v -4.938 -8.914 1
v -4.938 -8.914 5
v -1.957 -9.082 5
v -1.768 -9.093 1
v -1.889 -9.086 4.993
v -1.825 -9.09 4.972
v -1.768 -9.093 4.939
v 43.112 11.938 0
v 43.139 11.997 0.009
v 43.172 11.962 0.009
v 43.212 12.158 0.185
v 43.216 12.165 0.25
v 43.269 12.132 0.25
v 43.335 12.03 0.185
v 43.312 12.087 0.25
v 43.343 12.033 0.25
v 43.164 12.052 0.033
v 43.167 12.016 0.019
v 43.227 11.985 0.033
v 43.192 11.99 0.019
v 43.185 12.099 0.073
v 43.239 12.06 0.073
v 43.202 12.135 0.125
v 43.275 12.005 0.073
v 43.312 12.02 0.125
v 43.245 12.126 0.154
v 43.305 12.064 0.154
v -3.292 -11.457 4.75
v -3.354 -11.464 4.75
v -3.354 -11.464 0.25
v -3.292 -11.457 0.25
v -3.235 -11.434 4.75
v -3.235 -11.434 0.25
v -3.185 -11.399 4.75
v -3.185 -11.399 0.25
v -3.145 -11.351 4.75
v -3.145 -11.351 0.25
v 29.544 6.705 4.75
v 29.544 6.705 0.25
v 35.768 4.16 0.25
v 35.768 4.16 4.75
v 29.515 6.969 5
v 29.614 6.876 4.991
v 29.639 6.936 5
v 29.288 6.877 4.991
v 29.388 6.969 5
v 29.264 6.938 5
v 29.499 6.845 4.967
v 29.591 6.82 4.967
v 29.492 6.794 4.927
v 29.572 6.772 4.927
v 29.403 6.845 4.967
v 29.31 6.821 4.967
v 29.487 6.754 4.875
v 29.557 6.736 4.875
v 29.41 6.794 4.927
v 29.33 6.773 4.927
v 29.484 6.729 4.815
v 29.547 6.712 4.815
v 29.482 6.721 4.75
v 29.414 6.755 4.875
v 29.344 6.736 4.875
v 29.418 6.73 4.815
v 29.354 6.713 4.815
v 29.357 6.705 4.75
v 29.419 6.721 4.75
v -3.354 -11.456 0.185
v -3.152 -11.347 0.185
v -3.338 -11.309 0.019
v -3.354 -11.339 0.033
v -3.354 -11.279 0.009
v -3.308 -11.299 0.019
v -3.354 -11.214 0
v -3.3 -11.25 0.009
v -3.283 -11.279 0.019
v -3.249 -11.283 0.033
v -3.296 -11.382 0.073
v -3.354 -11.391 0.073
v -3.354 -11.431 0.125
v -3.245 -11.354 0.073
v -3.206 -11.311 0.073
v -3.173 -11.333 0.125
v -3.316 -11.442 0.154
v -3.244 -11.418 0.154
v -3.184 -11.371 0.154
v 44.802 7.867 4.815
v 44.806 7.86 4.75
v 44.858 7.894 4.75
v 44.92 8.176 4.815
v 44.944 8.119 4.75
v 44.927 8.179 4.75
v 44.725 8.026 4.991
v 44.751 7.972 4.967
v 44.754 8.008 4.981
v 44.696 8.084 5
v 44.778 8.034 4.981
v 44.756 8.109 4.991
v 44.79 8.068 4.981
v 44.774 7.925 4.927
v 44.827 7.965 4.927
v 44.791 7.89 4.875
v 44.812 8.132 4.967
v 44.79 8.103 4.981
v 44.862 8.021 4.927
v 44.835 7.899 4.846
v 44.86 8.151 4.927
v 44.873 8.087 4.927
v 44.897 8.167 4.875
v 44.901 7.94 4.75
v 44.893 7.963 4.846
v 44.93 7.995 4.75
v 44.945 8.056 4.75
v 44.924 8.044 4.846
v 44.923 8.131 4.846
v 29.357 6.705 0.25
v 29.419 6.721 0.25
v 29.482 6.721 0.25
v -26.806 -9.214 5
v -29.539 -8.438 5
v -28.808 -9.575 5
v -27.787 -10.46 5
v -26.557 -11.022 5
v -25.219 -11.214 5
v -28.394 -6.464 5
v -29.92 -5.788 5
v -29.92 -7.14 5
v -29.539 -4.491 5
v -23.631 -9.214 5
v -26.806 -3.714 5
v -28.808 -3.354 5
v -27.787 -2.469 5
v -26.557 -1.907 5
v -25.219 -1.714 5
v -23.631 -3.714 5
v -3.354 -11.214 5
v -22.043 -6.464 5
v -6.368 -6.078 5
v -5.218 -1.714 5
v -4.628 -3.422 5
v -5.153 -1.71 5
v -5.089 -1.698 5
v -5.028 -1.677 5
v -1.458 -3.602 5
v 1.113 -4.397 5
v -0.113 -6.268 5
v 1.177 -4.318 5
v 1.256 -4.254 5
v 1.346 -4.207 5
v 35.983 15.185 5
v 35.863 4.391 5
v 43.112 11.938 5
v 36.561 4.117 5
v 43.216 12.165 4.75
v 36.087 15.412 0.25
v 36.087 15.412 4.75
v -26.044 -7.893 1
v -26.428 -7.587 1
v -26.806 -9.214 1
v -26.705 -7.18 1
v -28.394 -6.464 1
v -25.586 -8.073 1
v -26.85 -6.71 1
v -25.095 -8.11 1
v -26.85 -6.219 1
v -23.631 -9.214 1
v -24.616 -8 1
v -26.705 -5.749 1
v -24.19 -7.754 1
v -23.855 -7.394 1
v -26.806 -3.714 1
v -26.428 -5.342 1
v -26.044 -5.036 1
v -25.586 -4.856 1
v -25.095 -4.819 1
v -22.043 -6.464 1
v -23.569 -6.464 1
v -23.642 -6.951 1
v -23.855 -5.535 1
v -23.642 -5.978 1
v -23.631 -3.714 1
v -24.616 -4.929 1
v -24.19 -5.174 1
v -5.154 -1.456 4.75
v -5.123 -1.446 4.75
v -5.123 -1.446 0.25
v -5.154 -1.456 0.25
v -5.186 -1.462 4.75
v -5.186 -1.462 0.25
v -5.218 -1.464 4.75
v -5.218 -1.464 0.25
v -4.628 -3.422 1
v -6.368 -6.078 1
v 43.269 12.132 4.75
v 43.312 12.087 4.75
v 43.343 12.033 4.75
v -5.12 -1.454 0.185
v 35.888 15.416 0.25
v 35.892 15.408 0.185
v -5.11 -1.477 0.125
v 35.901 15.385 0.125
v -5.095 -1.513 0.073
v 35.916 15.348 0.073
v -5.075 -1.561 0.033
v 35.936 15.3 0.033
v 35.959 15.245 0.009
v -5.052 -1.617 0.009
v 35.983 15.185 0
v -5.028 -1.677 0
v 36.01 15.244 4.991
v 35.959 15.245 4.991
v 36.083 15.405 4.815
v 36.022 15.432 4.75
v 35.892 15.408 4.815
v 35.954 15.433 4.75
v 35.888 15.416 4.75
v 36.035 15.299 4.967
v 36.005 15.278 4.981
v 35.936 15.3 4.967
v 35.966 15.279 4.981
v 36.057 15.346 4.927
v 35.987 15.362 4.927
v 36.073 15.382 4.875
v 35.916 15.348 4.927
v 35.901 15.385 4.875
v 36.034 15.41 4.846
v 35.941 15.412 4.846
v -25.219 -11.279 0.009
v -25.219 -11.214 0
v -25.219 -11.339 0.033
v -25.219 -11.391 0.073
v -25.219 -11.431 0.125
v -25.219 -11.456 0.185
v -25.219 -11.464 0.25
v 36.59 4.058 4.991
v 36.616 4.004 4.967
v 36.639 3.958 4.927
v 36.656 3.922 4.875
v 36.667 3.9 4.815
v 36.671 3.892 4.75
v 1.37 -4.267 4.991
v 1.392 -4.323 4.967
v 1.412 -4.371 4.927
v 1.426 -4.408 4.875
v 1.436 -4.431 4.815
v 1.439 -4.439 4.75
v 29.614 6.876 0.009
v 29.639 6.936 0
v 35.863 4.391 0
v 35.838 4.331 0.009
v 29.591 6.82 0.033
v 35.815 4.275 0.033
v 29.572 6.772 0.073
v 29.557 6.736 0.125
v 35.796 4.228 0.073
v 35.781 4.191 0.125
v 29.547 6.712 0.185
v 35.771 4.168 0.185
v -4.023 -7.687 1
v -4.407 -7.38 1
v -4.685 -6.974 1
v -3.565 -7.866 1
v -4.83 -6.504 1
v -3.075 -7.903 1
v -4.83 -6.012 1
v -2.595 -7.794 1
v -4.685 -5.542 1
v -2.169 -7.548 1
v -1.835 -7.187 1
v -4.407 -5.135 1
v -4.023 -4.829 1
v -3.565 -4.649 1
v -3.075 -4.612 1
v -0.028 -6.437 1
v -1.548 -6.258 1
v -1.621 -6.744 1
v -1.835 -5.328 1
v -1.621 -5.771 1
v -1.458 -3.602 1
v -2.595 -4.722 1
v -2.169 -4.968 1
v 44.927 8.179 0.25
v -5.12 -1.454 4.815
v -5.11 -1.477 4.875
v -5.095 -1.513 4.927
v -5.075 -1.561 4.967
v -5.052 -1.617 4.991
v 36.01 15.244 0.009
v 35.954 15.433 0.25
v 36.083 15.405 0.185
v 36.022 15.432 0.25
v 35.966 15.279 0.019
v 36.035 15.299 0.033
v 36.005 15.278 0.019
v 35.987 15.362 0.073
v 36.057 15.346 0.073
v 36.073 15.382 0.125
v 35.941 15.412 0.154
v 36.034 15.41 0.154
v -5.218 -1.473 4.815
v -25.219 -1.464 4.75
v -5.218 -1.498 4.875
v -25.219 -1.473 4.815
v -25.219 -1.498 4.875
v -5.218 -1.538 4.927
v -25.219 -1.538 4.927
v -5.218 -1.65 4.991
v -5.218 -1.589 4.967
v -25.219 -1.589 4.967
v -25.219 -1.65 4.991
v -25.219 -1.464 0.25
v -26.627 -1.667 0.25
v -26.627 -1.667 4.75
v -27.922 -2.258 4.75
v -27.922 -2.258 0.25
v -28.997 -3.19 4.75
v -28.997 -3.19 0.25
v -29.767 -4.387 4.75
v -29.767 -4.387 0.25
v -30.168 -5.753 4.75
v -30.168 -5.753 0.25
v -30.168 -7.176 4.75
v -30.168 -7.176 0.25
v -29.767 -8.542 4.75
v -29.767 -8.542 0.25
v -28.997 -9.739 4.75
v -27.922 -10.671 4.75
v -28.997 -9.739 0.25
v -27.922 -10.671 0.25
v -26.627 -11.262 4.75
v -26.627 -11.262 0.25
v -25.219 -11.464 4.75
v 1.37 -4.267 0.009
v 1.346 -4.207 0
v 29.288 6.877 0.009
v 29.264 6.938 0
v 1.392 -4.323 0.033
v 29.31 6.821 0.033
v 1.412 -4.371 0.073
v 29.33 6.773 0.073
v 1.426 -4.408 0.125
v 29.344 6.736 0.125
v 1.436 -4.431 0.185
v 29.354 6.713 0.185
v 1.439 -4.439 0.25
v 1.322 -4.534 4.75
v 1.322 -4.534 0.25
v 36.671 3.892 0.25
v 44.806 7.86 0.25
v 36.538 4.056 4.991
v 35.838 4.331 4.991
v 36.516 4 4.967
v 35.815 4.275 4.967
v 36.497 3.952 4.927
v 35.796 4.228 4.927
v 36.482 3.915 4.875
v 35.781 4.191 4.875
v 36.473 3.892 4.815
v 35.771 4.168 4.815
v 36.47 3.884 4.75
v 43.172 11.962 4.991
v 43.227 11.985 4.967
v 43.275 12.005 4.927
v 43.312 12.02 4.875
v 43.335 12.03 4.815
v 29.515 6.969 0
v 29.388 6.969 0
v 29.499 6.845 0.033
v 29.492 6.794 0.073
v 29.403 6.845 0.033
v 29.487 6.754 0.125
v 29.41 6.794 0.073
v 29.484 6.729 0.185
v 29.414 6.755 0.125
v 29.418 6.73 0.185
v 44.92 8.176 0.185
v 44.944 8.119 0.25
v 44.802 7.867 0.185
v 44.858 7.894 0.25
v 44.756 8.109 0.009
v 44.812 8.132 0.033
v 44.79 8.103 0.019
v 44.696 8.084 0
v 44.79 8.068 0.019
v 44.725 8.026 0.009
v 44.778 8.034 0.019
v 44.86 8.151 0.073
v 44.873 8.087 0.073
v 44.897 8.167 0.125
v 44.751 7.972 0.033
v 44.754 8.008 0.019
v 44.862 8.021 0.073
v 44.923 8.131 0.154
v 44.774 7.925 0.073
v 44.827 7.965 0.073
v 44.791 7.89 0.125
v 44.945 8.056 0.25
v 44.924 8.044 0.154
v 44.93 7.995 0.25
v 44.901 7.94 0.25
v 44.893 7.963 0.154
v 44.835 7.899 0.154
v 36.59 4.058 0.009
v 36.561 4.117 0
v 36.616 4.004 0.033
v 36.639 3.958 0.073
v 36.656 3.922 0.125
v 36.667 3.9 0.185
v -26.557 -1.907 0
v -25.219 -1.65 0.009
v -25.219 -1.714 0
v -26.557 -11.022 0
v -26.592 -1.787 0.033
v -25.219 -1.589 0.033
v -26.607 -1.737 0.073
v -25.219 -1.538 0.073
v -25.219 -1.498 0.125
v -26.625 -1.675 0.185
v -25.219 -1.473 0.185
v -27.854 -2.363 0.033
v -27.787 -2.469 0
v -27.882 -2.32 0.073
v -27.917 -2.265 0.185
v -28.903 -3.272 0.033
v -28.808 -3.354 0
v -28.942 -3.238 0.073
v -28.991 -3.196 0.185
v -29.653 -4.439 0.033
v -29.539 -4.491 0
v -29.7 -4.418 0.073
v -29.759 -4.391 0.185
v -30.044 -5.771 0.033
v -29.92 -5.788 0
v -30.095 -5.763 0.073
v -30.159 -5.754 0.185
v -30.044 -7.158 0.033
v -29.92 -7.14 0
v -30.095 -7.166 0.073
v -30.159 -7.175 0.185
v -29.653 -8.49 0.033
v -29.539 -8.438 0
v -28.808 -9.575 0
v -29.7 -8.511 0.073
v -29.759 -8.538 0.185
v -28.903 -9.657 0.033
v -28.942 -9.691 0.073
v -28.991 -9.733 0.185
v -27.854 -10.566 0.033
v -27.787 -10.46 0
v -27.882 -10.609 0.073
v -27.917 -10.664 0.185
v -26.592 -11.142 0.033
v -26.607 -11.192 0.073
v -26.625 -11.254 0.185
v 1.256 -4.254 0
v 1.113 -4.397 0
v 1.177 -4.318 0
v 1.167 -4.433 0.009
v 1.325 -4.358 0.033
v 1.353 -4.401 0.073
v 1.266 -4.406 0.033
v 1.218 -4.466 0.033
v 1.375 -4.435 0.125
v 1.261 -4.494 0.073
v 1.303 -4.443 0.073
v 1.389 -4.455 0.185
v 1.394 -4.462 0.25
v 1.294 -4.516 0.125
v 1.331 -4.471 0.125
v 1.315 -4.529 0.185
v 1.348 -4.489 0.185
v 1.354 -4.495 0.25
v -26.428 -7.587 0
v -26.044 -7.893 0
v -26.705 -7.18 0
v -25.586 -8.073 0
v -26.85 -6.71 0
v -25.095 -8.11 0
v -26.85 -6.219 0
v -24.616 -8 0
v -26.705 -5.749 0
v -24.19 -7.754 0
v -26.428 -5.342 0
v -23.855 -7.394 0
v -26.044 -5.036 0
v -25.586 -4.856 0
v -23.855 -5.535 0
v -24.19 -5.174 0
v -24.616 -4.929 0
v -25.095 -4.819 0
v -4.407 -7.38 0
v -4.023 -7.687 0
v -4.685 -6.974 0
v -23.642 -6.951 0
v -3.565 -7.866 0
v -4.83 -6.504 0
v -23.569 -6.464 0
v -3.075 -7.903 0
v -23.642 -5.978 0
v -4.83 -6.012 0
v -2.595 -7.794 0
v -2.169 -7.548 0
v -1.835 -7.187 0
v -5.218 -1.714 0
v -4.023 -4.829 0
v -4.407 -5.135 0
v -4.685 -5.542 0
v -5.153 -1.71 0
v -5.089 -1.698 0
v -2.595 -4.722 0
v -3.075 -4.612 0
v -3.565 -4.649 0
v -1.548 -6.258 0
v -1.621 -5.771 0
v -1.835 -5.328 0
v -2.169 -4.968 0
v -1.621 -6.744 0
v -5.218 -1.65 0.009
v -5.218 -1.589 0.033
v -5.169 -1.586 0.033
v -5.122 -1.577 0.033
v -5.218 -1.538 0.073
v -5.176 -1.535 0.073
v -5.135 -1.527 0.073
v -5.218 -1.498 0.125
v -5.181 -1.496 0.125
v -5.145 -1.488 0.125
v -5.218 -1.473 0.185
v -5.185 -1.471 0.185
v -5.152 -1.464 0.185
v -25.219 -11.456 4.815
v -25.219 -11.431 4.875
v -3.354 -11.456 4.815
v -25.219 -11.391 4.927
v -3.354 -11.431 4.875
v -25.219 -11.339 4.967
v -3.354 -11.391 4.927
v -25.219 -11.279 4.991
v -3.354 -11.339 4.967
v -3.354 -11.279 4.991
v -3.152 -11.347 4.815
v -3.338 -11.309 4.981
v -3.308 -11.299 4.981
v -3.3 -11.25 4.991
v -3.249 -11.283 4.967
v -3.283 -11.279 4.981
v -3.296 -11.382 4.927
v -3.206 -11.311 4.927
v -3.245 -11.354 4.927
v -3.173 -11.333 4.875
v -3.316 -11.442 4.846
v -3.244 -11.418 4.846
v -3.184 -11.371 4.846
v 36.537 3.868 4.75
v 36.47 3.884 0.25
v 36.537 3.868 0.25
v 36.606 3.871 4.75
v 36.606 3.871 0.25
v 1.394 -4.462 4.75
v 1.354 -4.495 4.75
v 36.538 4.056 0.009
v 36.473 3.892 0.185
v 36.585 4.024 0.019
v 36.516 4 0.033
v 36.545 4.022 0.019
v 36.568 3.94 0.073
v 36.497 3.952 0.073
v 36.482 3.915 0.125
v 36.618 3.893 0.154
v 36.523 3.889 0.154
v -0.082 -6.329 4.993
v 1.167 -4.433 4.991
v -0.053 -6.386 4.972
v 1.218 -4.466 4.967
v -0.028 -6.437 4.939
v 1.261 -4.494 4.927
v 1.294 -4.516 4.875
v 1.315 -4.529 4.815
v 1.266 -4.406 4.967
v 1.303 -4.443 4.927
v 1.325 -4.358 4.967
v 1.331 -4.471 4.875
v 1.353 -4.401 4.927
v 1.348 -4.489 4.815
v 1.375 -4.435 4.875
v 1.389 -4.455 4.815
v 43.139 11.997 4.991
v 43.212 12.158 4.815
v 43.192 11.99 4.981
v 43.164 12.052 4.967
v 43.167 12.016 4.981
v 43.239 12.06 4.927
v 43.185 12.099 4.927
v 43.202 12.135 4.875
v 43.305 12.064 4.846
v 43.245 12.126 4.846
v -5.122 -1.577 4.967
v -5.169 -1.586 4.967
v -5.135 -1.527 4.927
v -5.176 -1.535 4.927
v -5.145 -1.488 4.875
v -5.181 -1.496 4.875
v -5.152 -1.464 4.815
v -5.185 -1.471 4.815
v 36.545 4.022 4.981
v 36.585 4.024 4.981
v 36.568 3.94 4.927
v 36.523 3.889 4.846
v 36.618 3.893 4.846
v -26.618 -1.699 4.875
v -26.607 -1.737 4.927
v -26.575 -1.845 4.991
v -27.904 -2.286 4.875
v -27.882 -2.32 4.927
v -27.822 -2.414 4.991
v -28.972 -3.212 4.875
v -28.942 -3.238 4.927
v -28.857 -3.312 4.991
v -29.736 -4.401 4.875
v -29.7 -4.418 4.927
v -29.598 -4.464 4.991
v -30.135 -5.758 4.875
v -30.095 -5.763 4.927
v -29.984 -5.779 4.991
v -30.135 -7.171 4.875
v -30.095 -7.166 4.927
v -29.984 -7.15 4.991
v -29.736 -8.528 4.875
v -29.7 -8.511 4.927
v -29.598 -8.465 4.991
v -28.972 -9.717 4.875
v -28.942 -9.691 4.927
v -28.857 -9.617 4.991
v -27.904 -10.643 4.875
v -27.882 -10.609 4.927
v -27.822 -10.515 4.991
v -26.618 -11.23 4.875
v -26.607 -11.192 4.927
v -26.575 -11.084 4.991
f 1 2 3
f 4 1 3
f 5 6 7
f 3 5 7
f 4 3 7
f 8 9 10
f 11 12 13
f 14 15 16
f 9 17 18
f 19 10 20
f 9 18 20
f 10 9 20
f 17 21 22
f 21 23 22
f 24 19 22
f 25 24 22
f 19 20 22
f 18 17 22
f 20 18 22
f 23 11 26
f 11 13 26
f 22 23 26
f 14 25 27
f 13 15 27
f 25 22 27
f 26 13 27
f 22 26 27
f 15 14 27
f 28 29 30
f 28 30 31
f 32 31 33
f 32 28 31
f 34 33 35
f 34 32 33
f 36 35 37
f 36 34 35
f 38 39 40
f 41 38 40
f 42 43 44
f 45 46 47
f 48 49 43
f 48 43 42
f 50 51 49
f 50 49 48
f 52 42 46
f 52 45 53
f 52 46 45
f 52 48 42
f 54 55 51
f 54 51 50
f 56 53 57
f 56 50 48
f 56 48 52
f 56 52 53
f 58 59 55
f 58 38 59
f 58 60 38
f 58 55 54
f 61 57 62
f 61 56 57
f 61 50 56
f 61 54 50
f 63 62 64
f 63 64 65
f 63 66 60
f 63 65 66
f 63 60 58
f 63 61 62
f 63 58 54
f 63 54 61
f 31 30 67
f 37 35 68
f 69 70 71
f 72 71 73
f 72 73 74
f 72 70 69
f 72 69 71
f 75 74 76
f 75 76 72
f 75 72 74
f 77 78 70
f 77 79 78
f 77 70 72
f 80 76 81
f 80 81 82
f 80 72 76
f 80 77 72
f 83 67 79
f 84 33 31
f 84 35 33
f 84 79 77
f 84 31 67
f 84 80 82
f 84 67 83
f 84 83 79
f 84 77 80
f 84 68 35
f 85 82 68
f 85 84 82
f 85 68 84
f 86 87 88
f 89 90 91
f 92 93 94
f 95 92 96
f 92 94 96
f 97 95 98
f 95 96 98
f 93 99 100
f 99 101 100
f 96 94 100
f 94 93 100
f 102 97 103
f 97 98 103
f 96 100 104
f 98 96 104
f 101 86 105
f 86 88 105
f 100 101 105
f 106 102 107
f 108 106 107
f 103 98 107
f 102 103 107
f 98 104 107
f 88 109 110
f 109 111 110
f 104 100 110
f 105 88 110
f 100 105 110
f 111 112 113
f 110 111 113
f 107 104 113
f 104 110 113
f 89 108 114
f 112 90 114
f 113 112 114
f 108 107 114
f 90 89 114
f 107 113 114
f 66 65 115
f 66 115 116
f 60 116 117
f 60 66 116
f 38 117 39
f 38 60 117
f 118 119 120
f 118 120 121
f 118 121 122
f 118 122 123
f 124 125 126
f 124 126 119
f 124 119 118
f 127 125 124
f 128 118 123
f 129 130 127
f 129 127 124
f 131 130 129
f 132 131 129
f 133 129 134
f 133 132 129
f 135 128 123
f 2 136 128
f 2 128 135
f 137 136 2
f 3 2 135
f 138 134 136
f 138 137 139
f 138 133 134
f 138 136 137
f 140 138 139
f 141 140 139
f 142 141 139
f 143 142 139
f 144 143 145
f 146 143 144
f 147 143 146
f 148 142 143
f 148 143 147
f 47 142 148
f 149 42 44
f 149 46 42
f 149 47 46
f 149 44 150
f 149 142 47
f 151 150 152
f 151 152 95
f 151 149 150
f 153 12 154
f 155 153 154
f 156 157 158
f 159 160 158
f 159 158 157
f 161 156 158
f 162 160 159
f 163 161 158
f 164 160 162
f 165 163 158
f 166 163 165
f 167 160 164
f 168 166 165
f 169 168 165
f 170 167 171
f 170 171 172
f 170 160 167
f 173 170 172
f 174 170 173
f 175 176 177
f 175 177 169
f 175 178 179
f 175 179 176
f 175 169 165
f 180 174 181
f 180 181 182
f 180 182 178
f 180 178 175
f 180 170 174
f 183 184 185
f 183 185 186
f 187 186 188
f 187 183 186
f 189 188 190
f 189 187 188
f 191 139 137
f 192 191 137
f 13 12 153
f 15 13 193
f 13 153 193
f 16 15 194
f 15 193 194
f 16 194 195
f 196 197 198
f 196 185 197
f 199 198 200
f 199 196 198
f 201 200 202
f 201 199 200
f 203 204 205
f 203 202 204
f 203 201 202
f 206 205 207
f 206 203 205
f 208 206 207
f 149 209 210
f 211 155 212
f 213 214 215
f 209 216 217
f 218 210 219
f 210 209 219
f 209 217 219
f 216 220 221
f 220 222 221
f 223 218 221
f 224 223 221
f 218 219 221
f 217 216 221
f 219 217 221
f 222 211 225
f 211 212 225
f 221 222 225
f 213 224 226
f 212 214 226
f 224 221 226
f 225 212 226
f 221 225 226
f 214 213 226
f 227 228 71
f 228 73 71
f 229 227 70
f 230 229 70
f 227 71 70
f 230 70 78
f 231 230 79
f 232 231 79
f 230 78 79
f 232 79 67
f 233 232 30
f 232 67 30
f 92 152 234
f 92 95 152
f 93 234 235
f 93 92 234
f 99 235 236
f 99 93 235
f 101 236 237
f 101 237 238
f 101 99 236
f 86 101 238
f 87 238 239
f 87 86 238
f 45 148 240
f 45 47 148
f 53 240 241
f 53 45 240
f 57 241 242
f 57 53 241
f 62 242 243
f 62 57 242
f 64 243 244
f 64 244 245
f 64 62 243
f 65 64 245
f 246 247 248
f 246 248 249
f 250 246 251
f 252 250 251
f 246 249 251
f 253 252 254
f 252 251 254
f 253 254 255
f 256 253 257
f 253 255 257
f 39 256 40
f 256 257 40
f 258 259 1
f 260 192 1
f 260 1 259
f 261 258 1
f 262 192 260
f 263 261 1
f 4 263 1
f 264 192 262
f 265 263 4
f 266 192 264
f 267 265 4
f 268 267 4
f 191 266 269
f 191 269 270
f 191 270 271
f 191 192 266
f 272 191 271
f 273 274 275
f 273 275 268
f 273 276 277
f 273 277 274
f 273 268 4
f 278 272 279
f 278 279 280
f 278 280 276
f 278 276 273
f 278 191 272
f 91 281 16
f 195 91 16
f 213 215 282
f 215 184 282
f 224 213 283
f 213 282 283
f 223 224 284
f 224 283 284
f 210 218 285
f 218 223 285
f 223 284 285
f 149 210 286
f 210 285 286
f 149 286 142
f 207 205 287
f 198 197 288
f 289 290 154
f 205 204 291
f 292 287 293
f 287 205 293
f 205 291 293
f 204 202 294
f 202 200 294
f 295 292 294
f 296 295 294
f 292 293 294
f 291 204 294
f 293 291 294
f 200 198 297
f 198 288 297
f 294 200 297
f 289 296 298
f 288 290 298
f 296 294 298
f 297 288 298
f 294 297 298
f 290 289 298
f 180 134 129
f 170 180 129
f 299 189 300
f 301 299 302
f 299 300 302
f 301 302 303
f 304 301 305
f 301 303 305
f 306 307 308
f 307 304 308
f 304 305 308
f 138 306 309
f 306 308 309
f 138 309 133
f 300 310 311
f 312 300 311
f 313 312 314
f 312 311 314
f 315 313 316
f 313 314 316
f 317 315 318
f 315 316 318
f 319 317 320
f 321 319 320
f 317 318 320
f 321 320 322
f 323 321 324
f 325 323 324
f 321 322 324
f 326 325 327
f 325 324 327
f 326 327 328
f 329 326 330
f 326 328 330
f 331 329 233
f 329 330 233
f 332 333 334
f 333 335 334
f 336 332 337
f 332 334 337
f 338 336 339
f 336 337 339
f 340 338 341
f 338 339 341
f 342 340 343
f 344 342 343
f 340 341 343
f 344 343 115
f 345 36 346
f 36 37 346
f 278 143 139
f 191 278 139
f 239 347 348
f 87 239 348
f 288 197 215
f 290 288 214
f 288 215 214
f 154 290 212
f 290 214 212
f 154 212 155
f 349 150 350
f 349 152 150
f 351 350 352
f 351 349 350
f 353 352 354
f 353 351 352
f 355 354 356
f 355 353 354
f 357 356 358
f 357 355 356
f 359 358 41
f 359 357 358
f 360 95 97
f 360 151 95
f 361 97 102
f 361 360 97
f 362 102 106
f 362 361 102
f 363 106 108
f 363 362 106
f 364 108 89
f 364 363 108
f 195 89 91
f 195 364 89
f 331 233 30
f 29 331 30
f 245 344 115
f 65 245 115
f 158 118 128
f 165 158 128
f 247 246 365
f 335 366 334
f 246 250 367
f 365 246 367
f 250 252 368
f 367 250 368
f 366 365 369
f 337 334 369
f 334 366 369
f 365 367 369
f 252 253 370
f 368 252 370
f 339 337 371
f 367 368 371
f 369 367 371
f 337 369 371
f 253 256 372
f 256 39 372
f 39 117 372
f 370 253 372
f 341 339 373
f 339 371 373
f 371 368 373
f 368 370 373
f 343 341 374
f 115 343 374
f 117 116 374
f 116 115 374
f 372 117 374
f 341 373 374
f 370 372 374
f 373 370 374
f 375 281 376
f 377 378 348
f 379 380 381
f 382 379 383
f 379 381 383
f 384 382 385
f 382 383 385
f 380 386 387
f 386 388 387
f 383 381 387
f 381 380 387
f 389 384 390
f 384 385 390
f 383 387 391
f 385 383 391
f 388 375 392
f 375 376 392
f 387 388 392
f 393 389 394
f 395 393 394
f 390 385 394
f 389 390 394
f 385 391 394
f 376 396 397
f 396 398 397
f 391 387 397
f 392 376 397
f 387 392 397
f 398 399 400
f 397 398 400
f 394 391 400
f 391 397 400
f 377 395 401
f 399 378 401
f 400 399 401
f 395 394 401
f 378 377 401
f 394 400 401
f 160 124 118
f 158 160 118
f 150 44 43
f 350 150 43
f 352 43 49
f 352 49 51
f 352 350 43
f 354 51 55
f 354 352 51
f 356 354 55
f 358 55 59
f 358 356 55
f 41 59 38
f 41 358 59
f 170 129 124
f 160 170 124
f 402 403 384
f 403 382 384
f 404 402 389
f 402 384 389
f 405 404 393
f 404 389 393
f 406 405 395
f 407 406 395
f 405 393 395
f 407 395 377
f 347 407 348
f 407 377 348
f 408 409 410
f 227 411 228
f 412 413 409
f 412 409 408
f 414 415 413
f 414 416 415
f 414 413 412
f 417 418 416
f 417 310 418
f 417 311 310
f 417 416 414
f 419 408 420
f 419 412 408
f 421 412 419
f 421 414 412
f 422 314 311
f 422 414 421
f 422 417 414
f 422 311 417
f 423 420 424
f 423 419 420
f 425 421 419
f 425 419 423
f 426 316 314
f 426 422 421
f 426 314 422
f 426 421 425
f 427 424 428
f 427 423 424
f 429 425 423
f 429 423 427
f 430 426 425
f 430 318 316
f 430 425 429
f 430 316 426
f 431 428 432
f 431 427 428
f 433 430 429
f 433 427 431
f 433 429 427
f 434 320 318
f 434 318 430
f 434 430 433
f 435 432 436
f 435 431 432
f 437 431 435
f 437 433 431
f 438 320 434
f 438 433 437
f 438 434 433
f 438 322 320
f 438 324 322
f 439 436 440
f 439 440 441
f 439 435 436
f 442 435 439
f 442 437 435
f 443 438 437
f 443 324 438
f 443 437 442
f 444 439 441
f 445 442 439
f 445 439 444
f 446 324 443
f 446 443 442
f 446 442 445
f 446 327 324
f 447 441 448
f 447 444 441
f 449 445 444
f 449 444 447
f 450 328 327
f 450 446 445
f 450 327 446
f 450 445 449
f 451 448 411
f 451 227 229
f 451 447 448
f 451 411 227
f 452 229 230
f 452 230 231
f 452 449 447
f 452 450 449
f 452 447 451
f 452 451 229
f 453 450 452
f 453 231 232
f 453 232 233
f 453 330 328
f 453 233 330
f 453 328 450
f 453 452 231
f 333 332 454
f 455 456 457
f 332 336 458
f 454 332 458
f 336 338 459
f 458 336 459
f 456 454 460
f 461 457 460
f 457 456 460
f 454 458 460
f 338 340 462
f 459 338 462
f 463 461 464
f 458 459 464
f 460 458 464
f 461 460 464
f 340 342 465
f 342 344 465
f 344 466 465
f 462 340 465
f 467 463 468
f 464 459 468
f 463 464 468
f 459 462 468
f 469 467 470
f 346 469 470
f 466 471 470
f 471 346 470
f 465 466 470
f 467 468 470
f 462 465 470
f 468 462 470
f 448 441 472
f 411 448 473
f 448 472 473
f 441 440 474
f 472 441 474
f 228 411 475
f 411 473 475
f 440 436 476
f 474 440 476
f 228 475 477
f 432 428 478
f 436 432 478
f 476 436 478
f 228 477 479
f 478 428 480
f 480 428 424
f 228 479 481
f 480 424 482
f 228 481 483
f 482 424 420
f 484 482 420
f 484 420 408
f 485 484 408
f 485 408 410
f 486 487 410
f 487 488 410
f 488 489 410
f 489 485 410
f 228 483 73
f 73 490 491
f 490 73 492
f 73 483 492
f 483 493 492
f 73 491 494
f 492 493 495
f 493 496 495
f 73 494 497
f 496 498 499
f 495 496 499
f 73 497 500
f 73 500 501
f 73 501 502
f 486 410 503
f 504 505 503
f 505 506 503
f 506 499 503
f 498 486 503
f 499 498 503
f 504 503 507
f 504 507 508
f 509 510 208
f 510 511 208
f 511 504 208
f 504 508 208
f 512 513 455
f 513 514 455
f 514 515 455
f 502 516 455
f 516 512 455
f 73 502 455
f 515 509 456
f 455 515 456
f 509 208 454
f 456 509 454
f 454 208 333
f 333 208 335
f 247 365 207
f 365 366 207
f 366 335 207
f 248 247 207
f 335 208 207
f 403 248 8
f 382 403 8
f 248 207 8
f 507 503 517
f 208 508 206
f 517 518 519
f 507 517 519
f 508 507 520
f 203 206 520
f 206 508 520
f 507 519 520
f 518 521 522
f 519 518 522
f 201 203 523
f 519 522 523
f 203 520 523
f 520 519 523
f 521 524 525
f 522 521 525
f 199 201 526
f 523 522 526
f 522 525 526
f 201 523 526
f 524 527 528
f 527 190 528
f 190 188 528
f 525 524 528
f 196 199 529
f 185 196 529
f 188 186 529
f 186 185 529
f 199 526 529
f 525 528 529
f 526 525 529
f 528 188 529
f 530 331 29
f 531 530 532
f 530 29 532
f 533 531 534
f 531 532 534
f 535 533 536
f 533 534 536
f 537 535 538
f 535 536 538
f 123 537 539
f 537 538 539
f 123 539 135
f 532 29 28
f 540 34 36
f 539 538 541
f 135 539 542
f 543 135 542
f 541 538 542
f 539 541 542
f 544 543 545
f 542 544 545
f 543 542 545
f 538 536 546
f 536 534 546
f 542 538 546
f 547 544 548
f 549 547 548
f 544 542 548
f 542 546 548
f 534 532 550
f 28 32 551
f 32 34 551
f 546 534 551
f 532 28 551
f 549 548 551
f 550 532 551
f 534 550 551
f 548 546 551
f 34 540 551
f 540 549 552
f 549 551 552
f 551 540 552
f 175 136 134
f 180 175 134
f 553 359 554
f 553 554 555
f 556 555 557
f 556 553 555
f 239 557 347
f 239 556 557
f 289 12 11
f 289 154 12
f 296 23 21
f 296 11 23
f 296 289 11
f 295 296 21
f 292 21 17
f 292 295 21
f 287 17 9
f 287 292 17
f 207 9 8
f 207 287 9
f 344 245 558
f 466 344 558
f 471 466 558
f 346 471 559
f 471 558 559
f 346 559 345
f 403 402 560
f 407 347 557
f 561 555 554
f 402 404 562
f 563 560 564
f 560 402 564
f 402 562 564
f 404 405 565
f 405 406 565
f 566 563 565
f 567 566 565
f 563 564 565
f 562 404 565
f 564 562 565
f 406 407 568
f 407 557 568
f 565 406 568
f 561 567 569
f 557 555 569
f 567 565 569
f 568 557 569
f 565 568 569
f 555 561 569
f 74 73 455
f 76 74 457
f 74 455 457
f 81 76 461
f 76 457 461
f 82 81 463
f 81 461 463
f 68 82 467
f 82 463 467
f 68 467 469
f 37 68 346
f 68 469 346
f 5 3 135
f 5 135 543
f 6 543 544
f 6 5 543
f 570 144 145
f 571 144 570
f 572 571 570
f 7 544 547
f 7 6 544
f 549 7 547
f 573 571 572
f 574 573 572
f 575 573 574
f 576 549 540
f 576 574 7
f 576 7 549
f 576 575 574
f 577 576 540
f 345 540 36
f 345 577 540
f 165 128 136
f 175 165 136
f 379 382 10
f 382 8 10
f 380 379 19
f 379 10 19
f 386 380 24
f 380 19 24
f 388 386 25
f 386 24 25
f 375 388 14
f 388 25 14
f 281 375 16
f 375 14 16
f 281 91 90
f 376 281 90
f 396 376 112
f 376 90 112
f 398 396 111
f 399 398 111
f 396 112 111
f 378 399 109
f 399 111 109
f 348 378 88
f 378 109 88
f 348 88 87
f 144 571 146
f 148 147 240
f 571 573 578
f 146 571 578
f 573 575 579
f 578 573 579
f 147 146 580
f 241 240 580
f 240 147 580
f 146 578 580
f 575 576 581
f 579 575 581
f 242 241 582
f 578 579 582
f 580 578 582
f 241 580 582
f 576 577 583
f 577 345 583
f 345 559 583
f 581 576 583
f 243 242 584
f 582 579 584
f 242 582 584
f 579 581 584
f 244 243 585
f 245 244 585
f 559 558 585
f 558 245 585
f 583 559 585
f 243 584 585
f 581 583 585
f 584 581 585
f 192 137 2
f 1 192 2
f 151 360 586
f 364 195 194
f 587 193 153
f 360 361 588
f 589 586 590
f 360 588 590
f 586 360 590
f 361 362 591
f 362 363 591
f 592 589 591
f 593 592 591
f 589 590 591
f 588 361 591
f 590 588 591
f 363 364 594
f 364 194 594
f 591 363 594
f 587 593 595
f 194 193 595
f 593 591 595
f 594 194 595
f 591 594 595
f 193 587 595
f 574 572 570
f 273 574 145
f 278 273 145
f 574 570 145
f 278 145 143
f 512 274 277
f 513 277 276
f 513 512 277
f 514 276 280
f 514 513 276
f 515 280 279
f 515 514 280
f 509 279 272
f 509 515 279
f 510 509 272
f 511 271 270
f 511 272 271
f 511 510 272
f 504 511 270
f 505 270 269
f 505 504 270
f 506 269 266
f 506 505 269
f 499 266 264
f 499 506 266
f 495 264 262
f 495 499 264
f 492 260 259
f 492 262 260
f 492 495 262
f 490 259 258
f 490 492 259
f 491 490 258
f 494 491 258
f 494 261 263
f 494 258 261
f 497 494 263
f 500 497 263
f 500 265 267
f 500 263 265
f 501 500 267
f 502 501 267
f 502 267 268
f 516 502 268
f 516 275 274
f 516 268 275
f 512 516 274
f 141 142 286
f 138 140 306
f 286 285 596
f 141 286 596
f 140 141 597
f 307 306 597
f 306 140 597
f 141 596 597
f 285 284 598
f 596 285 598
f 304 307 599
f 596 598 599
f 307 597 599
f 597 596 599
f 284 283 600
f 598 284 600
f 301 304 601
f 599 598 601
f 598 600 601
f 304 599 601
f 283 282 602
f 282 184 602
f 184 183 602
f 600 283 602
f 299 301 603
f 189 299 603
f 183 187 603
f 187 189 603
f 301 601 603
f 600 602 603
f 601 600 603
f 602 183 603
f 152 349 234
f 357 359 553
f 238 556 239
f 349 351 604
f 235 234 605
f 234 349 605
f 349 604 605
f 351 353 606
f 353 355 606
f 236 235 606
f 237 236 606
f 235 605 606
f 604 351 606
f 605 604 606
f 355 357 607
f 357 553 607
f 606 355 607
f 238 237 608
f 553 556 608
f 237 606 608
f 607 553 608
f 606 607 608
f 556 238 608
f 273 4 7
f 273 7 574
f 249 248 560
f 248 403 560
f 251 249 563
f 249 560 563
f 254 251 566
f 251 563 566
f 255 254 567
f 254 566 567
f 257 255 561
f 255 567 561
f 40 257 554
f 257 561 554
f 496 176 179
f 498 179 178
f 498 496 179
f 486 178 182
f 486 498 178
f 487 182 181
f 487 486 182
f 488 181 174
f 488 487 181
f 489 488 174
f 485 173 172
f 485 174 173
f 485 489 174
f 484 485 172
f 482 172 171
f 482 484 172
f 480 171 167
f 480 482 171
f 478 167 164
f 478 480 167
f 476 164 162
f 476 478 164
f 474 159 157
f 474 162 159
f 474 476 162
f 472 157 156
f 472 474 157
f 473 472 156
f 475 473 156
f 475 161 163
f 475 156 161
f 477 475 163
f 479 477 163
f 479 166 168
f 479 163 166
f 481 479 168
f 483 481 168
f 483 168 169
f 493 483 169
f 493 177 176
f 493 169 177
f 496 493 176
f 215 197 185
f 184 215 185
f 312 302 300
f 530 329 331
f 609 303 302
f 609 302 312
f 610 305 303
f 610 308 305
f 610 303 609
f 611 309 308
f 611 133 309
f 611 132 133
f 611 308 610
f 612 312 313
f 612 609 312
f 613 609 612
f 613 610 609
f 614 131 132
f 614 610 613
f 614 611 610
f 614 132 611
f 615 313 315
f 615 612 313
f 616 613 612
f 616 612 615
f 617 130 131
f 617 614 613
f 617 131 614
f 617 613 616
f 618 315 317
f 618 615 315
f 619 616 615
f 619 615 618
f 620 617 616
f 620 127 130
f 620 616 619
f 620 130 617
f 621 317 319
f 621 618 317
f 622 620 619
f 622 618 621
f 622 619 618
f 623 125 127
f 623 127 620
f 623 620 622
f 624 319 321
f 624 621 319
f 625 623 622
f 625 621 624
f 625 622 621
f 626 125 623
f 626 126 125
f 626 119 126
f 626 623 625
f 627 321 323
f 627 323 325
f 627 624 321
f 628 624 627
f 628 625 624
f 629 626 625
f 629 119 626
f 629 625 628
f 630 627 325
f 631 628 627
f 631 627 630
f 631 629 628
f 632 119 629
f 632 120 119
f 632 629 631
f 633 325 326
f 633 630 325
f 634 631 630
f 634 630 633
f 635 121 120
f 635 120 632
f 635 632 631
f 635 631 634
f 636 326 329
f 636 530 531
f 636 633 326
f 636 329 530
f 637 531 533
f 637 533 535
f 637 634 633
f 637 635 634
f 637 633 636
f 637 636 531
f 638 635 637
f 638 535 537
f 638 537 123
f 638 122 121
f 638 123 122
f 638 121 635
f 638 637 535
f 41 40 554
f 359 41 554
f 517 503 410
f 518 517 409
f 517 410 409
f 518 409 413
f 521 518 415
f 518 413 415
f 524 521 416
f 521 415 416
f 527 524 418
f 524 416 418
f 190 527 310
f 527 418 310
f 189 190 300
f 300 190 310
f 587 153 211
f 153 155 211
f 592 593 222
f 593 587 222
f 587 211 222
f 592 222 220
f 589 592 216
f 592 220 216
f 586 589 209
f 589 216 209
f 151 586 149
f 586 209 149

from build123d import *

# Parameters (mm, degrees)
SKETCH1_R           = 1.65
BOSS_EXTRUDE1_DEPTH = 5
FILLET2_R           = 0.25
CUT_EXTRUDE1_DEPTH  = 4


with BuildPart() as part:
    # Sketch1 → Boss-Extrude1 (new body)
    # profile 1 of 2: a face of its own
    with BuildSketch(Plane.XY):
        with BuildLine():
            Line((-5.168635154, -1.464478016), (-25.218635154, -1.464478016))
            ThreePointArc((-25.218635154, -1.464478016), (-30.218635154, -6.464478016), (-25.218635154, -11.464478016))
            Line((-25.218635154, -11.464478016), (-3.218635154, -11.464478016))
            Line((-3.218635154, -11.464478016), (1.36555506, -4.468181425))
            ThreePointArc((1.36555506, -4.468181425), (-0.47833252, -2.282284635), (-3.218635154, -1.464478016))
            Line((-3.218635154, -1.464478016), (-5.168635154, -1.464478016))
        make_face()
        with Locations((-25.218635154, -6.464478016)):
            Circle(SKETCH1_R, mode=Mode.SUBTRACT)
        with Locations((-3.197929879, -6.257635448)):
            Circle(SKETCH1_R, mode=Mode.SUBTRACT)
    # profile 2 of 2: a face of its own
    with BuildSketch(Plane.XY):
        with BuildLine():
            Line((35.988446, 15.45724385), (-5.168635154, -1.464478016))
            Line((-5.168635154, -1.464478016), (-3.218635154, -1.464478016))
            ThreePointArc((-3.218635154, -1.464478016), (-0.47833252, -2.282284635), (1.36555506, -4.468181425))
            Line((1.36555506, -4.468181425), (29.450627286, 6.742809526))
            Line((29.450627286, 6.742809526), (35.767904523, 4.15974363))
            Line((35.767904523, 4.15974363), (36.572261964, 3.843716482))
            Line((36.572261964, 3.843716482), (45.016686804, 7.962377757))
            Line((45.016686804, 7.962377757), (43.305501447, 12.124329784))
            Line((43.305501447, 12.124329784), (35.988446, 15.45724385))
        make_face()
    extrude(amount=BOSS_EXTRUDE1_DEPTH)

    # Fillet2
    fillet2_edges = [part.edges().sort_by_distance(p)[0] for p in [
        (-14.218635154, -11.464478016, 0),
        (-30.218635154, -6.464478016, 0),
        (-15.193635154, -1.464478016, 0),
        (15.409905423, 6.996382917, 0),
        (-0.926540047, -7.966329721, 5),
        (39.646973723, 13.790786817, 0),
        (44.161094126, 10.04335377, 0),
        (40.794474384, 5.90304712, 0),
        (36.170083243, 4.001730056, 0),
        (32.609265904, 5.451276578, 0),
        (15.408091173, 1.137314051, 0),
        (-0.926540047, -7.966329721, 0),
        (15.408091173, 1.137314051, 5),
        (-3.218635154, -11.464478016, 2.5),
        (-5.168635154, -1.464478016, 2.5),
        (35.988446, 15.45724385, 2.5),
        (43.305501447, 12.124329784, 2.5),
        (45.016686804, 7.962377757, 2.5),
        (36.572261964, 3.843716482, 2.5),
        (35.767904523, 4.15974363, 2.5),
        (29.450627286, 6.742809526, 2.5),
        (1.36555506, -4.468181425, 2.5),
        (32.609265904, 5.451276578, 5),
        (36.170083243, 4.001730056, 5),
        (40.794474384, 5.90304712, 5),
        (44.161094126, 10.04335377, 5),
        (39.646973723, 13.790786817, 5),
        (15.409905423, 6.996382917, 5),
        (-15.193635154, -1.464478016, 5),
        (-30.218635154, -6.464478016, 5),
        (-14.218635154, -11.464478016, 5),
    ]]
    fillet(fillet2_edges, radius=FILLET2_R)

    # Sketch2 → Cut-Extrude1 (cut)
    with BuildSketch(Plane.XY.offset(5)):
        Polygon((-23.630921913, -9.214478016), (-22.043208673, -6.464478016), (-23.630921913, -3.714478016), (-26.806348394, -3.714478016), (-28.394061634, -6.464478016), (-26.806348394, -9.214478016), align=None)
        Polygon((-0.027560565, -6.436777135), (-1.45760397, -3.601585926), (-4.627973284, -3.422444239), (-6.368299193, -6.078493761), (-4.938255788, -8.91368497), (-1.767886474, -9.092826657), align=None)
    extrude(amount=-CUT_EXTRUDE1_DEPTH, mode=Mode.SUBTRACT)


solid = part.part
